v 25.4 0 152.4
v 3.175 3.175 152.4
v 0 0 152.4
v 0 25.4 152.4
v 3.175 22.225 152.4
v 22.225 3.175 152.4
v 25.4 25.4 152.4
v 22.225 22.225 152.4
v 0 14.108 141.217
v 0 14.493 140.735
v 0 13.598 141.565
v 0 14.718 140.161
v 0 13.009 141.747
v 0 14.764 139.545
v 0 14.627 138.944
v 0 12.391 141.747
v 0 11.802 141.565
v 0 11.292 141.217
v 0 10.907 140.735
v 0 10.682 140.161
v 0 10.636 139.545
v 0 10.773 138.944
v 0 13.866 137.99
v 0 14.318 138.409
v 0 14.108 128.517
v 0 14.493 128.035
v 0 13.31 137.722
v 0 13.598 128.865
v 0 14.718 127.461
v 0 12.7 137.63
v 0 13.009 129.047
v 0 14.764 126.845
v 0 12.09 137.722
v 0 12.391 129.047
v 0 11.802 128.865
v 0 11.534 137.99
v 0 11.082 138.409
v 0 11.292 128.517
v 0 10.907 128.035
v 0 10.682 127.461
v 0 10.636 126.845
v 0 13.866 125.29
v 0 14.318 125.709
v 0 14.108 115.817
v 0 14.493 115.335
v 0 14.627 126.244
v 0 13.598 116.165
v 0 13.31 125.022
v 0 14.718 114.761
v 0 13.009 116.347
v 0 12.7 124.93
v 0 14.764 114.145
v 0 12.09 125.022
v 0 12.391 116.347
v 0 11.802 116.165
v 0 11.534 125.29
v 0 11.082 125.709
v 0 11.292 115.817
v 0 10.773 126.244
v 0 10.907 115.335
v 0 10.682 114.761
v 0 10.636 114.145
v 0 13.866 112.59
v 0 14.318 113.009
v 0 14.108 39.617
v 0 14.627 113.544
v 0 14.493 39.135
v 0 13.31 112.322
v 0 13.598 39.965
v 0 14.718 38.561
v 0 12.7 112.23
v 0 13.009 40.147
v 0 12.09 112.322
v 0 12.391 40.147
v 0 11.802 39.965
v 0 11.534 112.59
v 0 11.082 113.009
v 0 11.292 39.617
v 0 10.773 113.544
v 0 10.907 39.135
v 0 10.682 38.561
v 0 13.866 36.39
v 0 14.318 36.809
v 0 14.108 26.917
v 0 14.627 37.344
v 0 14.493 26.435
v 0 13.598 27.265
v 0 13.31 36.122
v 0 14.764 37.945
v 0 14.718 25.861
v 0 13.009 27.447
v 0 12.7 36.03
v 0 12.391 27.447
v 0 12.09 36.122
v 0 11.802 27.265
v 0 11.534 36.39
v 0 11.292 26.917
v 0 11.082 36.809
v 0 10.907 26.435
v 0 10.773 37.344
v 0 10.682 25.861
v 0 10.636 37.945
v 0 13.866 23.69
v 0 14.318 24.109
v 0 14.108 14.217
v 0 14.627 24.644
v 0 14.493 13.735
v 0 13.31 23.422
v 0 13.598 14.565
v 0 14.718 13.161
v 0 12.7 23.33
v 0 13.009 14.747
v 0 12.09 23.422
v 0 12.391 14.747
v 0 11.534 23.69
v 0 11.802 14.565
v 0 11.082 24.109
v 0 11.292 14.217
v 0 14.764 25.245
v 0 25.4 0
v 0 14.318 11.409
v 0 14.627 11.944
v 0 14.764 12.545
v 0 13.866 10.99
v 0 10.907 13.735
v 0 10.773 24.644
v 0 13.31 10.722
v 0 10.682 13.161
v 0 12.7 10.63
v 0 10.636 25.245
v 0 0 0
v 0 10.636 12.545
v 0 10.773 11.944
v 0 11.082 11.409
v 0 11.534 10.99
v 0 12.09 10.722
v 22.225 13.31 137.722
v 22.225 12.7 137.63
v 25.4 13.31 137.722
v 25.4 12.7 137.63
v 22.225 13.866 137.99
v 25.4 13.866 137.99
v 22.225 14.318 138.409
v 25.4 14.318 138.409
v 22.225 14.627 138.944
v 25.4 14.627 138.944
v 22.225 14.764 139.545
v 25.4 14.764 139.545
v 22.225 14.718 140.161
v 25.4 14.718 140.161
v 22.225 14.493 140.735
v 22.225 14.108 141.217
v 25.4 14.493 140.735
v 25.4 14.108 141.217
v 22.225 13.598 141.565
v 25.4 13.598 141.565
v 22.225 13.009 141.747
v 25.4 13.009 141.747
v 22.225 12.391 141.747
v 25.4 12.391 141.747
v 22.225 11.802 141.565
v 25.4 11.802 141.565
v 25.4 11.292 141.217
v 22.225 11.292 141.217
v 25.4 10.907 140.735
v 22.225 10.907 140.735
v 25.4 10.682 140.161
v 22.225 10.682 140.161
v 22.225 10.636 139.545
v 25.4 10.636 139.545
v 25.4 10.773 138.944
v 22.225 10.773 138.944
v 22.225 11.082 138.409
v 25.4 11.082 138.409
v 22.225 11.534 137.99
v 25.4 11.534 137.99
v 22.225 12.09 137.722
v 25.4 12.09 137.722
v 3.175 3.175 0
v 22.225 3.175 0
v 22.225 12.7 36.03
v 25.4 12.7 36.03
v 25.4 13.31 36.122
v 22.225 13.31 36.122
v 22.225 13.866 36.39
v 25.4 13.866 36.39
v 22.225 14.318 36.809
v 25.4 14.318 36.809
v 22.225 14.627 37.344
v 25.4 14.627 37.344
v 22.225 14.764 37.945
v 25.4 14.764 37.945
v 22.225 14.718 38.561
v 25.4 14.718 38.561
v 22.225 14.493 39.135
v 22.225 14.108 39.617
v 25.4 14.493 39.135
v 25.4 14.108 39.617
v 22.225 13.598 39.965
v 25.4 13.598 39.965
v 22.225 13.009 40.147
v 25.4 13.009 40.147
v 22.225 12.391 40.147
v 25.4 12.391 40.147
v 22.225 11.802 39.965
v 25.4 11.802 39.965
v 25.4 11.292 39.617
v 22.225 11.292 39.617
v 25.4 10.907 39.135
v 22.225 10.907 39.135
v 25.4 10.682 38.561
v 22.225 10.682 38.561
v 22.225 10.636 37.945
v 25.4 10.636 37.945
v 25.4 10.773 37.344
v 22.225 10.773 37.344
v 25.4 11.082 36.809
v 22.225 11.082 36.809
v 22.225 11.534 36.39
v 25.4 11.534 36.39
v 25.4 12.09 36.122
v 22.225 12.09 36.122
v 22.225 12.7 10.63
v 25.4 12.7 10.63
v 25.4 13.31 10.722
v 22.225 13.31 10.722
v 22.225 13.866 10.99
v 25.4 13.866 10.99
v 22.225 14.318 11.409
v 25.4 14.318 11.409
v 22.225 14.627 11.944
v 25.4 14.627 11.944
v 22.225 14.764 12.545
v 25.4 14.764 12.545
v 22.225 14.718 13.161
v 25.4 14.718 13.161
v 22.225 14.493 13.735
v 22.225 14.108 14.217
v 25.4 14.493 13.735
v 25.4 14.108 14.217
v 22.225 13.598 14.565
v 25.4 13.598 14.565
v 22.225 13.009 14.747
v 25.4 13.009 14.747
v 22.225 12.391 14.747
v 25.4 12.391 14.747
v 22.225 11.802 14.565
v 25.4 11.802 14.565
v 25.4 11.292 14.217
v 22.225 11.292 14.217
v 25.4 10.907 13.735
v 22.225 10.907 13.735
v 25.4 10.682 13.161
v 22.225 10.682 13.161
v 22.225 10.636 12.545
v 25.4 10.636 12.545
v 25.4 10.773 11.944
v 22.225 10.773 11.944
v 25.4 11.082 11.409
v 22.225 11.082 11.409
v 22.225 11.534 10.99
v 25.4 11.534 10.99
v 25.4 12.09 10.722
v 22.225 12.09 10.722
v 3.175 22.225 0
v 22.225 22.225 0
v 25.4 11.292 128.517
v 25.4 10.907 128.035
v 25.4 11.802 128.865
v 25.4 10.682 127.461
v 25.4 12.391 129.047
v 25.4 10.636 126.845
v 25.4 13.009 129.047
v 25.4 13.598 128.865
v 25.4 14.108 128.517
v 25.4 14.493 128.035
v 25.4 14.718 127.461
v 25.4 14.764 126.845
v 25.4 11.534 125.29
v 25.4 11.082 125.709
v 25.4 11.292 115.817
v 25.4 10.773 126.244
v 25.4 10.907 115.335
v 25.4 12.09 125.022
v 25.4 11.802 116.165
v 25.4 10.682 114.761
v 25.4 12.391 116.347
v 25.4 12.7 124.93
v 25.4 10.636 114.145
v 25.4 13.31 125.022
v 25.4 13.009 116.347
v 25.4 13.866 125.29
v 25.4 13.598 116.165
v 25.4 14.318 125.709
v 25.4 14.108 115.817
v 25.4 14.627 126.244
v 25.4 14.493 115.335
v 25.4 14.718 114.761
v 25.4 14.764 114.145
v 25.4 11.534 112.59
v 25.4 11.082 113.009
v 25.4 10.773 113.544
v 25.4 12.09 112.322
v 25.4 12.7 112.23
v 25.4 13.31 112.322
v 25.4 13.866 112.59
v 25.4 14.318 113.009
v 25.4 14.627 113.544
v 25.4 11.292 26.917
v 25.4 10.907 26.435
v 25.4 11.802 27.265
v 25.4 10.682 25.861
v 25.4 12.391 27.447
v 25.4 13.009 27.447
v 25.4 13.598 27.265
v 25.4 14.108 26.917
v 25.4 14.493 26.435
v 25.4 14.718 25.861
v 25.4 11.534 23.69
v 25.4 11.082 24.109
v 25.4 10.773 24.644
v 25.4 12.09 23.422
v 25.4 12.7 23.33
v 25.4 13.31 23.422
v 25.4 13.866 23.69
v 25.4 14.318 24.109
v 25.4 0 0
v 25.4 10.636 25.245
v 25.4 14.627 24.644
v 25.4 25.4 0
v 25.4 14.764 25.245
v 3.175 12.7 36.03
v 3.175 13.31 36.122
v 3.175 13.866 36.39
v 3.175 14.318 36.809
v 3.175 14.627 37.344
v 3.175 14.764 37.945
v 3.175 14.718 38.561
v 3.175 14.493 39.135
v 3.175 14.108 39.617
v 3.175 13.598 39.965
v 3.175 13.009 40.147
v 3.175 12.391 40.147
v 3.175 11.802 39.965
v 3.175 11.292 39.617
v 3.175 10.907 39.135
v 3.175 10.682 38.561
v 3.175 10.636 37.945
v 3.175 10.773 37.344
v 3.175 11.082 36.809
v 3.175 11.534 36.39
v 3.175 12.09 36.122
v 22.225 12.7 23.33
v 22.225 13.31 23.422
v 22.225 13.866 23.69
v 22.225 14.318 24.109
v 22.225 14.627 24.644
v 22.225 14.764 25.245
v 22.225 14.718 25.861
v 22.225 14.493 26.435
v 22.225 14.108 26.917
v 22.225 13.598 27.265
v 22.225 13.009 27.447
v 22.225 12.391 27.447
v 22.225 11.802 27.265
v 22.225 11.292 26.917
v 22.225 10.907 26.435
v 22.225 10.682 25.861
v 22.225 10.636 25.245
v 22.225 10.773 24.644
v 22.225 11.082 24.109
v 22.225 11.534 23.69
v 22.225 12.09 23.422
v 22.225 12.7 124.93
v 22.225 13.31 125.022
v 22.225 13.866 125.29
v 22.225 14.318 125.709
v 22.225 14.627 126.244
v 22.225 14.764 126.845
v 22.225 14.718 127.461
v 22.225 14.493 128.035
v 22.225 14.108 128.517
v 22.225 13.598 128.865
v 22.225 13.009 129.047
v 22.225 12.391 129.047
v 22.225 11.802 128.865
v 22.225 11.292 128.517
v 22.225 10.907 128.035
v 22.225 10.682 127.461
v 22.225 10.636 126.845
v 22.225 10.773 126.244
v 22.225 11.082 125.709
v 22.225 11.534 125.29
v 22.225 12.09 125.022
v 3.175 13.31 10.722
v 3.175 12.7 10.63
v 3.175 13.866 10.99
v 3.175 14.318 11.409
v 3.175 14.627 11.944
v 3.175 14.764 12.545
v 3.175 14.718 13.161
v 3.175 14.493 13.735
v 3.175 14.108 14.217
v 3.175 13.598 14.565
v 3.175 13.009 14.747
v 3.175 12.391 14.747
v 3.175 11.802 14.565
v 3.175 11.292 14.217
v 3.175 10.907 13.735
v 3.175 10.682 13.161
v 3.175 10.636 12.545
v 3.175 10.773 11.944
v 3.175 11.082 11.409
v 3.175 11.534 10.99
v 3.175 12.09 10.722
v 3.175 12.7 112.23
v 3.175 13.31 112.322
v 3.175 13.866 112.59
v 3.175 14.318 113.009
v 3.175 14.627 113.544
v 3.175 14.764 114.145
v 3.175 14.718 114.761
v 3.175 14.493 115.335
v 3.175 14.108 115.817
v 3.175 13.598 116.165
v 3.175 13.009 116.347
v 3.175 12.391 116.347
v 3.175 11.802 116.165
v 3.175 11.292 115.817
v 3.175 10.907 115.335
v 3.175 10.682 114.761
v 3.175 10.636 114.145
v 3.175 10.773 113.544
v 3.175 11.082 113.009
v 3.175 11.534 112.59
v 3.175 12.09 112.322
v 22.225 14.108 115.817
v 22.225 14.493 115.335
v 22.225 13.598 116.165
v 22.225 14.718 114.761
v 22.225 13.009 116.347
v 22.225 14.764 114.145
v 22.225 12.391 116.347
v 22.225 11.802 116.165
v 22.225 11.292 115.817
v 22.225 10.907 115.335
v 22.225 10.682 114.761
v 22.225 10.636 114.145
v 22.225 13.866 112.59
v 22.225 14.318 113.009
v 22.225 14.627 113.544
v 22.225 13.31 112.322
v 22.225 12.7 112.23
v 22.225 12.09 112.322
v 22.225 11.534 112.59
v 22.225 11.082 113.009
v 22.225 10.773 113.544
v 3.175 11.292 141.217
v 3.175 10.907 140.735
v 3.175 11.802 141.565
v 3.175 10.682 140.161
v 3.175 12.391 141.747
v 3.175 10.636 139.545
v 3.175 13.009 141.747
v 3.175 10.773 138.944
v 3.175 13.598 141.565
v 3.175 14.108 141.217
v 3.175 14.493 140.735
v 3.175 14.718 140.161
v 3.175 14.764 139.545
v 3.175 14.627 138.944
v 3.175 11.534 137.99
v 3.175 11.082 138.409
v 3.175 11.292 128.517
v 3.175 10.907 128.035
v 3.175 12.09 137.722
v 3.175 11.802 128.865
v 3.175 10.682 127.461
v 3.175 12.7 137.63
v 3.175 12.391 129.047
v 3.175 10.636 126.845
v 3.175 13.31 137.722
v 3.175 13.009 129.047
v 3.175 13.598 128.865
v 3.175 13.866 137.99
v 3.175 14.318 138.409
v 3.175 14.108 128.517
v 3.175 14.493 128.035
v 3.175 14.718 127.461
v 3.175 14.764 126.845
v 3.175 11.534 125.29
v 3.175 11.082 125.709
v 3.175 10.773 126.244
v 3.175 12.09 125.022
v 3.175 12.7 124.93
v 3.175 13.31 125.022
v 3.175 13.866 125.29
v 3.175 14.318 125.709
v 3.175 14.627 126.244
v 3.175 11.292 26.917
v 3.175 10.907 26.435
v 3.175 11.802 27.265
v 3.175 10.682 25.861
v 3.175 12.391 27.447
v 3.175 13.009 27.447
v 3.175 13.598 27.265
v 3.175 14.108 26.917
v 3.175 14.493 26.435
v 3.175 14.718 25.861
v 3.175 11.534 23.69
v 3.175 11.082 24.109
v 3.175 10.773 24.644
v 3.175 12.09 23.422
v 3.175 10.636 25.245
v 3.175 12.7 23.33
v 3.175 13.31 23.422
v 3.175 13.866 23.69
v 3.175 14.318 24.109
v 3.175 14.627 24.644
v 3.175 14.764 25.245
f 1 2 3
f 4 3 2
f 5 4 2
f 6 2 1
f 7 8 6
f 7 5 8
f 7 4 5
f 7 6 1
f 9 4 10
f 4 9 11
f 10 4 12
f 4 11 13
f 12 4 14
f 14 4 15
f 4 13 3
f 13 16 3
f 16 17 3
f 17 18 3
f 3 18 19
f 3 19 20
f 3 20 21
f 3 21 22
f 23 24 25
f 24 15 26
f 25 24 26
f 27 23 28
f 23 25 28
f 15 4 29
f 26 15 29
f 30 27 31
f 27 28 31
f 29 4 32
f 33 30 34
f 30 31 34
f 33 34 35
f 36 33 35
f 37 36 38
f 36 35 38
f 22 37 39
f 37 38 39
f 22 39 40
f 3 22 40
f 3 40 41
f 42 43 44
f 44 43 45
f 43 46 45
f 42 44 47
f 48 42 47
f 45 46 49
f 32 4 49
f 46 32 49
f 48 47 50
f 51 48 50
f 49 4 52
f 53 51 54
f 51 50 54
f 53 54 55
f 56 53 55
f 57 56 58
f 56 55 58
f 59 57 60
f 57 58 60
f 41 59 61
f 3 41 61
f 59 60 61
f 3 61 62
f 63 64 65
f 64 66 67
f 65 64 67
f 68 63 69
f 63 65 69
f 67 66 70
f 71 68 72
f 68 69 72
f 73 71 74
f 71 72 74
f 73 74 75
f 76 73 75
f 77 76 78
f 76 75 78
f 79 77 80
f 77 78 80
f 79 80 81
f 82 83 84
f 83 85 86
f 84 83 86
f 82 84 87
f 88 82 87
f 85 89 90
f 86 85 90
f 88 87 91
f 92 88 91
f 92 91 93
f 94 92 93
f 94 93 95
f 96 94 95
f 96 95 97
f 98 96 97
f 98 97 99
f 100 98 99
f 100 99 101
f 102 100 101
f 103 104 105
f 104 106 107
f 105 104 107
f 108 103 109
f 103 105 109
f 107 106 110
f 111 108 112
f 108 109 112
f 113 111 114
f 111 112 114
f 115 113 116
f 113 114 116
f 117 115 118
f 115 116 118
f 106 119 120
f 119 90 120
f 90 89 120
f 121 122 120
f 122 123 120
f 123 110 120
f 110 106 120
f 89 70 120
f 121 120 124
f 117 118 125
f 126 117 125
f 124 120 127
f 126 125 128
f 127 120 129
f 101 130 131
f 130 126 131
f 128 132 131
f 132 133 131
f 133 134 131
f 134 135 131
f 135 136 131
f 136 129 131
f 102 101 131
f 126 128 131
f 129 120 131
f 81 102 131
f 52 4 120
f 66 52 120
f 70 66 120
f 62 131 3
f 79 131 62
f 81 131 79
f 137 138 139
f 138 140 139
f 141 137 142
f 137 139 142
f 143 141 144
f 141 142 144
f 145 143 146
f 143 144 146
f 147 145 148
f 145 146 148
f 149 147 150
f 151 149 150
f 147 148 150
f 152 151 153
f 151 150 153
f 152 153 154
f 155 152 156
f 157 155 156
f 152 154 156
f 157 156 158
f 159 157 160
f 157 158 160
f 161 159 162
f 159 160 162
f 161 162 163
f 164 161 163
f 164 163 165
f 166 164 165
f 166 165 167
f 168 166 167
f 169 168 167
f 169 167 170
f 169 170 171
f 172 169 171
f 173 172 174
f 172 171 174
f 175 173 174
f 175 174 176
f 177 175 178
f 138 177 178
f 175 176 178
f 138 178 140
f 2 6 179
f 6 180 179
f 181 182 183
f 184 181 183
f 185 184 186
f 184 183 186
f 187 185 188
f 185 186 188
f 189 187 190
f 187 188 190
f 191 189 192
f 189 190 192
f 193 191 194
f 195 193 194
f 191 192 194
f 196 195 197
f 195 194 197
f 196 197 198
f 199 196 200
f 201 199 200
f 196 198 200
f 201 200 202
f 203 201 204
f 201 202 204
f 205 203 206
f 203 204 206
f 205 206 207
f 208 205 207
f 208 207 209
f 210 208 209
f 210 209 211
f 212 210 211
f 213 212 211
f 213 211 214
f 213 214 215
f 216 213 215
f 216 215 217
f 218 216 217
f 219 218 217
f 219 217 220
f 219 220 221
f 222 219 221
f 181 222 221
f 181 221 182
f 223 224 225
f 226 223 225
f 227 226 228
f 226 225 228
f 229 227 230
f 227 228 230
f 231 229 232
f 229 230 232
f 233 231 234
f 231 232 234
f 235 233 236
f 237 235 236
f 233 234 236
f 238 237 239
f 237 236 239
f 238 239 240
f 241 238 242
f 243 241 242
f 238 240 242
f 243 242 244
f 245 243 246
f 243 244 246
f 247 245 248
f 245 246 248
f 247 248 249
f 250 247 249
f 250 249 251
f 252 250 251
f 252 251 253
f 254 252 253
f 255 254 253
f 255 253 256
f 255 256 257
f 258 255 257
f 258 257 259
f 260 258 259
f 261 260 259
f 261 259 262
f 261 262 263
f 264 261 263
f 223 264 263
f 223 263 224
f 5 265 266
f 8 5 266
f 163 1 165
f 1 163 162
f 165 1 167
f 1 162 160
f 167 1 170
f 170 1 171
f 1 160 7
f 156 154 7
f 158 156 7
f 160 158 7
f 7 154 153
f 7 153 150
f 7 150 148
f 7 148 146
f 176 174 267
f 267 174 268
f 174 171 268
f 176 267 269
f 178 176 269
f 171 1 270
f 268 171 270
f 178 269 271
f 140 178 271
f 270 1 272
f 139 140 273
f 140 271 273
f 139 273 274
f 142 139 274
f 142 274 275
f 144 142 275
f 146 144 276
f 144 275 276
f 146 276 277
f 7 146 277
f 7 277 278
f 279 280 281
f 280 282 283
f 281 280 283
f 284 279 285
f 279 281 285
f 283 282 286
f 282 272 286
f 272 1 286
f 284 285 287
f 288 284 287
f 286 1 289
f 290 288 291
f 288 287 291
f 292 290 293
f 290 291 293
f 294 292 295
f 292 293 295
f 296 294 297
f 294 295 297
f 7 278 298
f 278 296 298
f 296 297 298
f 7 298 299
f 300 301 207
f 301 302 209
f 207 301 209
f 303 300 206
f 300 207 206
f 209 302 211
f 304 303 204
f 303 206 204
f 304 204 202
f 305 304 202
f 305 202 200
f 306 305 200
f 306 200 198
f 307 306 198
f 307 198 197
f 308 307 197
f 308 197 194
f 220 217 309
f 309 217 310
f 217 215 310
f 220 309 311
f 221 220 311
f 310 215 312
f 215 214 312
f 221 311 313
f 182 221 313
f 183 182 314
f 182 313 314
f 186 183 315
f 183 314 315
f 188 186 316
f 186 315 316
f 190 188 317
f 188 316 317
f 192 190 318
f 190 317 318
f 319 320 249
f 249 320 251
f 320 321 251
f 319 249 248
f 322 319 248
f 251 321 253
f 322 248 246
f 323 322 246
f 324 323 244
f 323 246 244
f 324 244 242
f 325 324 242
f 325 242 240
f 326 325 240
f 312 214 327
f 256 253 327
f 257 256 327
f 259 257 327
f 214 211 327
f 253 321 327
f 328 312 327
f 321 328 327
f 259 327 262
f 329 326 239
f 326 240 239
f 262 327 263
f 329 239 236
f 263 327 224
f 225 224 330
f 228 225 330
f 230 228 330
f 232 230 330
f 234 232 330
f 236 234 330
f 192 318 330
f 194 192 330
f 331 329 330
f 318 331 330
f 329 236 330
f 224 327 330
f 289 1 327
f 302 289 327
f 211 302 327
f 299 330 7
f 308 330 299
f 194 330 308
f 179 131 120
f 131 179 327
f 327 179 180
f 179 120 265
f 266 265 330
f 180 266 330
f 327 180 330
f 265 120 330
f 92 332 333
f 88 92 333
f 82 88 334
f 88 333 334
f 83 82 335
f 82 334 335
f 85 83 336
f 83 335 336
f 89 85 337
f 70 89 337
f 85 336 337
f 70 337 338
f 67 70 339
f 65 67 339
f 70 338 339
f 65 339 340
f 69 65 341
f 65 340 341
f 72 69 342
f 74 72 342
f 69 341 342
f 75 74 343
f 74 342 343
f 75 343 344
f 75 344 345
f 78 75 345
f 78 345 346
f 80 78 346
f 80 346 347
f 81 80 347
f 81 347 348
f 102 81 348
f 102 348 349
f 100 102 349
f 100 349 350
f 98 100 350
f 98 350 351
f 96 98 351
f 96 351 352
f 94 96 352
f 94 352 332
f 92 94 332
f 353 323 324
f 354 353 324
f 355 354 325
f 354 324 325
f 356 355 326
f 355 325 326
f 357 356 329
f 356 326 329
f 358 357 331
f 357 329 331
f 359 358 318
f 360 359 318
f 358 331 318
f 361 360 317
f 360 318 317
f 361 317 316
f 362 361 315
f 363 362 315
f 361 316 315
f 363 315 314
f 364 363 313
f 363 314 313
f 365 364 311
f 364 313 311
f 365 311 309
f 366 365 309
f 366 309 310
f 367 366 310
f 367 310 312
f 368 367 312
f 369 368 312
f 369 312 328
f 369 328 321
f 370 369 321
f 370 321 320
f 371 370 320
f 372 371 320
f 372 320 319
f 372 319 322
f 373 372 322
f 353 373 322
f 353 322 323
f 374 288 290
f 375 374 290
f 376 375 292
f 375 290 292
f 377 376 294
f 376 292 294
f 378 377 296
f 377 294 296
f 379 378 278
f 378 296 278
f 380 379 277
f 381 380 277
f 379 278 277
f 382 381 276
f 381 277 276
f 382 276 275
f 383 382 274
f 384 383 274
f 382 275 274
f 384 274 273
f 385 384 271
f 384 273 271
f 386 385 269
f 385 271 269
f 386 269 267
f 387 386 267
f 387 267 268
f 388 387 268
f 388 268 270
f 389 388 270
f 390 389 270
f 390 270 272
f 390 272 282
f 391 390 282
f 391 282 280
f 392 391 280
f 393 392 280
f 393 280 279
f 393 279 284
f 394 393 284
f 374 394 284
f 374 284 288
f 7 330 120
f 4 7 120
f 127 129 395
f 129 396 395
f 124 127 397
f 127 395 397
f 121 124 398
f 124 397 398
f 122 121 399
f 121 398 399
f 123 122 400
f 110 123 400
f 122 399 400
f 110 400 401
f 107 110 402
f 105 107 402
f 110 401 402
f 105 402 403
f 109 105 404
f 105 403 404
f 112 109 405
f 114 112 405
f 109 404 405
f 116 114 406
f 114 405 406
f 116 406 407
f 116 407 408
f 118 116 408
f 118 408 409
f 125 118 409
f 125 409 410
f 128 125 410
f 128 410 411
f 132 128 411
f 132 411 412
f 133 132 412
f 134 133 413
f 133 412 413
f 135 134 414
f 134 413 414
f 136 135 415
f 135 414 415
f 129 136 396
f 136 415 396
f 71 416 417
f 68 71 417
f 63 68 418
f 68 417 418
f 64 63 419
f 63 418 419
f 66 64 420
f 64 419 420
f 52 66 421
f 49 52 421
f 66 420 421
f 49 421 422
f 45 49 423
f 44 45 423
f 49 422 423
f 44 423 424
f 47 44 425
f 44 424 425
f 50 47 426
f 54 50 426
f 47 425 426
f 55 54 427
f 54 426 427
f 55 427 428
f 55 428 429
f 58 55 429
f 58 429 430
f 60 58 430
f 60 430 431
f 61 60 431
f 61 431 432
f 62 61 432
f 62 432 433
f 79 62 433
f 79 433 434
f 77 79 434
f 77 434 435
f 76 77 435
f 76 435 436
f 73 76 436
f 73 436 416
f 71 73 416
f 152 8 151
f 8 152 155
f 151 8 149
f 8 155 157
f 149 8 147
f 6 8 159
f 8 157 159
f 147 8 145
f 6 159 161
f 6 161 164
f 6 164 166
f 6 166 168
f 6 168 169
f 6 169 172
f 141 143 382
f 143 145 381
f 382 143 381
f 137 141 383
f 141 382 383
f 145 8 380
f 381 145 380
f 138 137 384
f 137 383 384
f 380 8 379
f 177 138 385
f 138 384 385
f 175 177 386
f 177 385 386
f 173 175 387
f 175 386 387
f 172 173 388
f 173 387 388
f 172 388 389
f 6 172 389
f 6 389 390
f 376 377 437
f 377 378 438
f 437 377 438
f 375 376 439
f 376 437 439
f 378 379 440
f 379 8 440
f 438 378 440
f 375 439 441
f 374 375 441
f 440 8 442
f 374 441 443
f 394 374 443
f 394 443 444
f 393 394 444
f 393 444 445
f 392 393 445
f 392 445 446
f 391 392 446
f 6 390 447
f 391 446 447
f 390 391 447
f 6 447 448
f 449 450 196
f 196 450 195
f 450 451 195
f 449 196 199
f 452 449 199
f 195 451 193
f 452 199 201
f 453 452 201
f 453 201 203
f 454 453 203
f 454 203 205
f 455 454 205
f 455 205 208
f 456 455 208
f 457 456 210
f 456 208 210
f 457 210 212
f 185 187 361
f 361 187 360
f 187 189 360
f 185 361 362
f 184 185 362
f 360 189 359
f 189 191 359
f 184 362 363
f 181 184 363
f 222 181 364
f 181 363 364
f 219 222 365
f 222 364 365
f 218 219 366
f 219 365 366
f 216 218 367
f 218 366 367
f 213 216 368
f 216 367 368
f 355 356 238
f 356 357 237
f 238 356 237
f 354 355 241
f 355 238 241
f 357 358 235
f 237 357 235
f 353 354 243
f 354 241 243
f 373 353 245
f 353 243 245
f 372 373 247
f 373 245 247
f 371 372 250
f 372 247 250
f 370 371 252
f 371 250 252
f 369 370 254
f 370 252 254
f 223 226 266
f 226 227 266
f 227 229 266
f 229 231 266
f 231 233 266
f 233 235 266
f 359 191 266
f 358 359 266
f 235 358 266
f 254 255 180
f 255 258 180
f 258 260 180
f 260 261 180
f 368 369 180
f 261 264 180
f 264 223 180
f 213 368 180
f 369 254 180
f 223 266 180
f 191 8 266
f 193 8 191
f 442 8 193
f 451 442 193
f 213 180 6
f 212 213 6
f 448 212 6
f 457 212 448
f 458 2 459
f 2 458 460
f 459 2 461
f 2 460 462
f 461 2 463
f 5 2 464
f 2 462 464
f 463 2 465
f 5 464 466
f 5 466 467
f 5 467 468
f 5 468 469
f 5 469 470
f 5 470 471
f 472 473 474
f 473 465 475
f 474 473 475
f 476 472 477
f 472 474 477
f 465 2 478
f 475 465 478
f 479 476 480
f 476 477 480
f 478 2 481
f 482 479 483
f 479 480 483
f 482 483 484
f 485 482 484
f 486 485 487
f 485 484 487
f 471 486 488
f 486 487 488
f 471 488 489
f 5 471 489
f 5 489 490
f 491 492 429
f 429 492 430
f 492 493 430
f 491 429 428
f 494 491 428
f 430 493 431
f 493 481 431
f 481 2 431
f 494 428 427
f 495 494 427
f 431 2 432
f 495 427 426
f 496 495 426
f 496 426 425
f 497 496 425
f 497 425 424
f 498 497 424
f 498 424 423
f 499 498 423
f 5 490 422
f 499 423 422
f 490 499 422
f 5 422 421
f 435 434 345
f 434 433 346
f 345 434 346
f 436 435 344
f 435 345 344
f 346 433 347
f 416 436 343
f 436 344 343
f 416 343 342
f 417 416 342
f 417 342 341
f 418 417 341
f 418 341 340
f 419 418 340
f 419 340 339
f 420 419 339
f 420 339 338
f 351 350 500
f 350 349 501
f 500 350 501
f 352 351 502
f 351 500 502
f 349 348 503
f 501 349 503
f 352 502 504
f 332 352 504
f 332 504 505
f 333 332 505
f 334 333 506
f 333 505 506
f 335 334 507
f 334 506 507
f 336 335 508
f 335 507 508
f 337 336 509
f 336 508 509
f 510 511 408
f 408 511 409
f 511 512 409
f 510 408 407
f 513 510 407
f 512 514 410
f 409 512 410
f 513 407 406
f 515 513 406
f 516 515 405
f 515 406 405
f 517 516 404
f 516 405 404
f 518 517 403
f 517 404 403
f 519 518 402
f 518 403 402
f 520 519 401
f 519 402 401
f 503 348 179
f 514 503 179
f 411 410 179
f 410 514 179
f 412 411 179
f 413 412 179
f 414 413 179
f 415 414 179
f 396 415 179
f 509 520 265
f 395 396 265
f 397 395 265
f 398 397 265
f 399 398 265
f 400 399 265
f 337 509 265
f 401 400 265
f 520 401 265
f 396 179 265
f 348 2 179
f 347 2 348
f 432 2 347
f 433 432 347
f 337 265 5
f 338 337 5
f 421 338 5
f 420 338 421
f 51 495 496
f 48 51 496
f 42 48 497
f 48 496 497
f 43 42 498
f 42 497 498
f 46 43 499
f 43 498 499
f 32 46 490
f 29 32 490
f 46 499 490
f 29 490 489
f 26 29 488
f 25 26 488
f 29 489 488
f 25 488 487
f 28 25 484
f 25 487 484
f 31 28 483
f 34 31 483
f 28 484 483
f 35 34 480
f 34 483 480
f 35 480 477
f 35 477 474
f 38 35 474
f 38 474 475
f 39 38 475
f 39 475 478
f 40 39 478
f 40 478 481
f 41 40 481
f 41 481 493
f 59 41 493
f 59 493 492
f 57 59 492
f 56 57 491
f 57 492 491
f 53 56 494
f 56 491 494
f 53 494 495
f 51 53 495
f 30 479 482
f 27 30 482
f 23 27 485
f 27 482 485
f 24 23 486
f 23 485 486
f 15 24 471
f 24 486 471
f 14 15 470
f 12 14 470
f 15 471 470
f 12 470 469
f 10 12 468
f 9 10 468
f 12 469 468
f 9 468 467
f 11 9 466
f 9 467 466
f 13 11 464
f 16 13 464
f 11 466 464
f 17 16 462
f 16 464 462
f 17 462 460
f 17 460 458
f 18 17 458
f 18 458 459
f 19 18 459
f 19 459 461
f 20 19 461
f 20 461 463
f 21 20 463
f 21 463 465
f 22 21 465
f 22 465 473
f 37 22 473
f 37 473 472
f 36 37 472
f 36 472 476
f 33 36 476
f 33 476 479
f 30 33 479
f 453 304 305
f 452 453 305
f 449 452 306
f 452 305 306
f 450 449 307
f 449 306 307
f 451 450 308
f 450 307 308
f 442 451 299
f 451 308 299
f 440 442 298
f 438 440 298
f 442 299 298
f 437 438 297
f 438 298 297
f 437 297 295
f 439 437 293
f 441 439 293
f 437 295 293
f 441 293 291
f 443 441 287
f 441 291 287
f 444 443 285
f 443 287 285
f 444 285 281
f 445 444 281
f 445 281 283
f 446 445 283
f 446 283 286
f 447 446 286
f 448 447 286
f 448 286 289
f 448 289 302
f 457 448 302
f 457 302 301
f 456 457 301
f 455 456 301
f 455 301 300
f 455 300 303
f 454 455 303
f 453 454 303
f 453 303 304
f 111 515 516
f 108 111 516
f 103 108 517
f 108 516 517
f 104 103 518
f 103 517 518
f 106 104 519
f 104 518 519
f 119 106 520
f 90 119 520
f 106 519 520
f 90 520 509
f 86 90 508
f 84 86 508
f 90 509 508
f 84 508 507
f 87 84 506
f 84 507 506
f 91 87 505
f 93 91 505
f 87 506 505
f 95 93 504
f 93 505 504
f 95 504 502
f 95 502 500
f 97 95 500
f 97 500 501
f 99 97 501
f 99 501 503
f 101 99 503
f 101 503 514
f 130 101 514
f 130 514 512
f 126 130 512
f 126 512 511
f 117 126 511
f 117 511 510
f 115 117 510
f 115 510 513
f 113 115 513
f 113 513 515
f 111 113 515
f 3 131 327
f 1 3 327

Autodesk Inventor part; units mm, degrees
ref_plane "YZ Plane" through (0, 0, 0) normal (1, 0, 0) x (0, 1, 0)
ref_plane "XZ Plane" through (0, 0, 0) normal (0, 1, 0) x (-1, 0, 0)
ref_plane "XY Plane" through (0, 0, 0) normal (0, 0, 1) x (1, 0, 0)
sketch "Sketch1" plane through (0, 0, 0) normal (0, 0, 1) x (1, 0, 0)
  line L0 (0, 0) -> (25.4, 0)
  line L1 (25.4, 0) -> (25.4, 25.4)
  line L2 (25.4, 25.4) -> (0, 25.4)
  line L3 (0, 25.4) -> (0, 0)
  line L4 (3.175, 22.225) -> (22.225, 22.225)
  line L5 (22.225, 22.225) -> (22.225, 3.175)
  line L6 (22.225, 3.175) -> (3.175, 3.175)
  line L7 (3.175, 3.175) -> (3.175, 22.225)
  dimension "d0" = 25.4
  dimension "d1" = 25.4
  dimension "d3" = 3.175
extrude "Extrusion1" add sketch "Sketch1" along normal blind 152.4
sketch "Sketch2" plane through (25.4, 0, 0) normal (1, 0, 0) x (0, 0, -1)
  line L0 (0, 25.4) -> (-152.4, 25.4) projected
  line L1 (-152.4, 0) -> (-152.4, 25.4) projected
  line L2 (0, 0) -> (-152.4, 0) projected
  circle A0 centre (-139.7, 12.7) radius 2.0701
  circle A1 centre (-127, 12.7) radius 2.0701
  circle A2 centre (-114.3, 12.7) radius 2.0701
  line L3 (-76.2, 25.4) -> (-76.2, 0) construction
  circle A3 centre (-12.7, 12.7) radius 2.0701
  circle A4 centre (-25.4, 12.7) radius 2.0701
  circle A5 centre (-38.1, 12.7) radius 2.0701
  dimension "d6" = 4.1402
  dimension "d7" = 12.7
  dimension "d8" = 12.7
  dimension "d11" = 12.7
extrude "Extrusion2" cut sketch "Sketch2" against normal blind 152.4
properties part number "Clapper Vertical 6 in Segment (4)"
